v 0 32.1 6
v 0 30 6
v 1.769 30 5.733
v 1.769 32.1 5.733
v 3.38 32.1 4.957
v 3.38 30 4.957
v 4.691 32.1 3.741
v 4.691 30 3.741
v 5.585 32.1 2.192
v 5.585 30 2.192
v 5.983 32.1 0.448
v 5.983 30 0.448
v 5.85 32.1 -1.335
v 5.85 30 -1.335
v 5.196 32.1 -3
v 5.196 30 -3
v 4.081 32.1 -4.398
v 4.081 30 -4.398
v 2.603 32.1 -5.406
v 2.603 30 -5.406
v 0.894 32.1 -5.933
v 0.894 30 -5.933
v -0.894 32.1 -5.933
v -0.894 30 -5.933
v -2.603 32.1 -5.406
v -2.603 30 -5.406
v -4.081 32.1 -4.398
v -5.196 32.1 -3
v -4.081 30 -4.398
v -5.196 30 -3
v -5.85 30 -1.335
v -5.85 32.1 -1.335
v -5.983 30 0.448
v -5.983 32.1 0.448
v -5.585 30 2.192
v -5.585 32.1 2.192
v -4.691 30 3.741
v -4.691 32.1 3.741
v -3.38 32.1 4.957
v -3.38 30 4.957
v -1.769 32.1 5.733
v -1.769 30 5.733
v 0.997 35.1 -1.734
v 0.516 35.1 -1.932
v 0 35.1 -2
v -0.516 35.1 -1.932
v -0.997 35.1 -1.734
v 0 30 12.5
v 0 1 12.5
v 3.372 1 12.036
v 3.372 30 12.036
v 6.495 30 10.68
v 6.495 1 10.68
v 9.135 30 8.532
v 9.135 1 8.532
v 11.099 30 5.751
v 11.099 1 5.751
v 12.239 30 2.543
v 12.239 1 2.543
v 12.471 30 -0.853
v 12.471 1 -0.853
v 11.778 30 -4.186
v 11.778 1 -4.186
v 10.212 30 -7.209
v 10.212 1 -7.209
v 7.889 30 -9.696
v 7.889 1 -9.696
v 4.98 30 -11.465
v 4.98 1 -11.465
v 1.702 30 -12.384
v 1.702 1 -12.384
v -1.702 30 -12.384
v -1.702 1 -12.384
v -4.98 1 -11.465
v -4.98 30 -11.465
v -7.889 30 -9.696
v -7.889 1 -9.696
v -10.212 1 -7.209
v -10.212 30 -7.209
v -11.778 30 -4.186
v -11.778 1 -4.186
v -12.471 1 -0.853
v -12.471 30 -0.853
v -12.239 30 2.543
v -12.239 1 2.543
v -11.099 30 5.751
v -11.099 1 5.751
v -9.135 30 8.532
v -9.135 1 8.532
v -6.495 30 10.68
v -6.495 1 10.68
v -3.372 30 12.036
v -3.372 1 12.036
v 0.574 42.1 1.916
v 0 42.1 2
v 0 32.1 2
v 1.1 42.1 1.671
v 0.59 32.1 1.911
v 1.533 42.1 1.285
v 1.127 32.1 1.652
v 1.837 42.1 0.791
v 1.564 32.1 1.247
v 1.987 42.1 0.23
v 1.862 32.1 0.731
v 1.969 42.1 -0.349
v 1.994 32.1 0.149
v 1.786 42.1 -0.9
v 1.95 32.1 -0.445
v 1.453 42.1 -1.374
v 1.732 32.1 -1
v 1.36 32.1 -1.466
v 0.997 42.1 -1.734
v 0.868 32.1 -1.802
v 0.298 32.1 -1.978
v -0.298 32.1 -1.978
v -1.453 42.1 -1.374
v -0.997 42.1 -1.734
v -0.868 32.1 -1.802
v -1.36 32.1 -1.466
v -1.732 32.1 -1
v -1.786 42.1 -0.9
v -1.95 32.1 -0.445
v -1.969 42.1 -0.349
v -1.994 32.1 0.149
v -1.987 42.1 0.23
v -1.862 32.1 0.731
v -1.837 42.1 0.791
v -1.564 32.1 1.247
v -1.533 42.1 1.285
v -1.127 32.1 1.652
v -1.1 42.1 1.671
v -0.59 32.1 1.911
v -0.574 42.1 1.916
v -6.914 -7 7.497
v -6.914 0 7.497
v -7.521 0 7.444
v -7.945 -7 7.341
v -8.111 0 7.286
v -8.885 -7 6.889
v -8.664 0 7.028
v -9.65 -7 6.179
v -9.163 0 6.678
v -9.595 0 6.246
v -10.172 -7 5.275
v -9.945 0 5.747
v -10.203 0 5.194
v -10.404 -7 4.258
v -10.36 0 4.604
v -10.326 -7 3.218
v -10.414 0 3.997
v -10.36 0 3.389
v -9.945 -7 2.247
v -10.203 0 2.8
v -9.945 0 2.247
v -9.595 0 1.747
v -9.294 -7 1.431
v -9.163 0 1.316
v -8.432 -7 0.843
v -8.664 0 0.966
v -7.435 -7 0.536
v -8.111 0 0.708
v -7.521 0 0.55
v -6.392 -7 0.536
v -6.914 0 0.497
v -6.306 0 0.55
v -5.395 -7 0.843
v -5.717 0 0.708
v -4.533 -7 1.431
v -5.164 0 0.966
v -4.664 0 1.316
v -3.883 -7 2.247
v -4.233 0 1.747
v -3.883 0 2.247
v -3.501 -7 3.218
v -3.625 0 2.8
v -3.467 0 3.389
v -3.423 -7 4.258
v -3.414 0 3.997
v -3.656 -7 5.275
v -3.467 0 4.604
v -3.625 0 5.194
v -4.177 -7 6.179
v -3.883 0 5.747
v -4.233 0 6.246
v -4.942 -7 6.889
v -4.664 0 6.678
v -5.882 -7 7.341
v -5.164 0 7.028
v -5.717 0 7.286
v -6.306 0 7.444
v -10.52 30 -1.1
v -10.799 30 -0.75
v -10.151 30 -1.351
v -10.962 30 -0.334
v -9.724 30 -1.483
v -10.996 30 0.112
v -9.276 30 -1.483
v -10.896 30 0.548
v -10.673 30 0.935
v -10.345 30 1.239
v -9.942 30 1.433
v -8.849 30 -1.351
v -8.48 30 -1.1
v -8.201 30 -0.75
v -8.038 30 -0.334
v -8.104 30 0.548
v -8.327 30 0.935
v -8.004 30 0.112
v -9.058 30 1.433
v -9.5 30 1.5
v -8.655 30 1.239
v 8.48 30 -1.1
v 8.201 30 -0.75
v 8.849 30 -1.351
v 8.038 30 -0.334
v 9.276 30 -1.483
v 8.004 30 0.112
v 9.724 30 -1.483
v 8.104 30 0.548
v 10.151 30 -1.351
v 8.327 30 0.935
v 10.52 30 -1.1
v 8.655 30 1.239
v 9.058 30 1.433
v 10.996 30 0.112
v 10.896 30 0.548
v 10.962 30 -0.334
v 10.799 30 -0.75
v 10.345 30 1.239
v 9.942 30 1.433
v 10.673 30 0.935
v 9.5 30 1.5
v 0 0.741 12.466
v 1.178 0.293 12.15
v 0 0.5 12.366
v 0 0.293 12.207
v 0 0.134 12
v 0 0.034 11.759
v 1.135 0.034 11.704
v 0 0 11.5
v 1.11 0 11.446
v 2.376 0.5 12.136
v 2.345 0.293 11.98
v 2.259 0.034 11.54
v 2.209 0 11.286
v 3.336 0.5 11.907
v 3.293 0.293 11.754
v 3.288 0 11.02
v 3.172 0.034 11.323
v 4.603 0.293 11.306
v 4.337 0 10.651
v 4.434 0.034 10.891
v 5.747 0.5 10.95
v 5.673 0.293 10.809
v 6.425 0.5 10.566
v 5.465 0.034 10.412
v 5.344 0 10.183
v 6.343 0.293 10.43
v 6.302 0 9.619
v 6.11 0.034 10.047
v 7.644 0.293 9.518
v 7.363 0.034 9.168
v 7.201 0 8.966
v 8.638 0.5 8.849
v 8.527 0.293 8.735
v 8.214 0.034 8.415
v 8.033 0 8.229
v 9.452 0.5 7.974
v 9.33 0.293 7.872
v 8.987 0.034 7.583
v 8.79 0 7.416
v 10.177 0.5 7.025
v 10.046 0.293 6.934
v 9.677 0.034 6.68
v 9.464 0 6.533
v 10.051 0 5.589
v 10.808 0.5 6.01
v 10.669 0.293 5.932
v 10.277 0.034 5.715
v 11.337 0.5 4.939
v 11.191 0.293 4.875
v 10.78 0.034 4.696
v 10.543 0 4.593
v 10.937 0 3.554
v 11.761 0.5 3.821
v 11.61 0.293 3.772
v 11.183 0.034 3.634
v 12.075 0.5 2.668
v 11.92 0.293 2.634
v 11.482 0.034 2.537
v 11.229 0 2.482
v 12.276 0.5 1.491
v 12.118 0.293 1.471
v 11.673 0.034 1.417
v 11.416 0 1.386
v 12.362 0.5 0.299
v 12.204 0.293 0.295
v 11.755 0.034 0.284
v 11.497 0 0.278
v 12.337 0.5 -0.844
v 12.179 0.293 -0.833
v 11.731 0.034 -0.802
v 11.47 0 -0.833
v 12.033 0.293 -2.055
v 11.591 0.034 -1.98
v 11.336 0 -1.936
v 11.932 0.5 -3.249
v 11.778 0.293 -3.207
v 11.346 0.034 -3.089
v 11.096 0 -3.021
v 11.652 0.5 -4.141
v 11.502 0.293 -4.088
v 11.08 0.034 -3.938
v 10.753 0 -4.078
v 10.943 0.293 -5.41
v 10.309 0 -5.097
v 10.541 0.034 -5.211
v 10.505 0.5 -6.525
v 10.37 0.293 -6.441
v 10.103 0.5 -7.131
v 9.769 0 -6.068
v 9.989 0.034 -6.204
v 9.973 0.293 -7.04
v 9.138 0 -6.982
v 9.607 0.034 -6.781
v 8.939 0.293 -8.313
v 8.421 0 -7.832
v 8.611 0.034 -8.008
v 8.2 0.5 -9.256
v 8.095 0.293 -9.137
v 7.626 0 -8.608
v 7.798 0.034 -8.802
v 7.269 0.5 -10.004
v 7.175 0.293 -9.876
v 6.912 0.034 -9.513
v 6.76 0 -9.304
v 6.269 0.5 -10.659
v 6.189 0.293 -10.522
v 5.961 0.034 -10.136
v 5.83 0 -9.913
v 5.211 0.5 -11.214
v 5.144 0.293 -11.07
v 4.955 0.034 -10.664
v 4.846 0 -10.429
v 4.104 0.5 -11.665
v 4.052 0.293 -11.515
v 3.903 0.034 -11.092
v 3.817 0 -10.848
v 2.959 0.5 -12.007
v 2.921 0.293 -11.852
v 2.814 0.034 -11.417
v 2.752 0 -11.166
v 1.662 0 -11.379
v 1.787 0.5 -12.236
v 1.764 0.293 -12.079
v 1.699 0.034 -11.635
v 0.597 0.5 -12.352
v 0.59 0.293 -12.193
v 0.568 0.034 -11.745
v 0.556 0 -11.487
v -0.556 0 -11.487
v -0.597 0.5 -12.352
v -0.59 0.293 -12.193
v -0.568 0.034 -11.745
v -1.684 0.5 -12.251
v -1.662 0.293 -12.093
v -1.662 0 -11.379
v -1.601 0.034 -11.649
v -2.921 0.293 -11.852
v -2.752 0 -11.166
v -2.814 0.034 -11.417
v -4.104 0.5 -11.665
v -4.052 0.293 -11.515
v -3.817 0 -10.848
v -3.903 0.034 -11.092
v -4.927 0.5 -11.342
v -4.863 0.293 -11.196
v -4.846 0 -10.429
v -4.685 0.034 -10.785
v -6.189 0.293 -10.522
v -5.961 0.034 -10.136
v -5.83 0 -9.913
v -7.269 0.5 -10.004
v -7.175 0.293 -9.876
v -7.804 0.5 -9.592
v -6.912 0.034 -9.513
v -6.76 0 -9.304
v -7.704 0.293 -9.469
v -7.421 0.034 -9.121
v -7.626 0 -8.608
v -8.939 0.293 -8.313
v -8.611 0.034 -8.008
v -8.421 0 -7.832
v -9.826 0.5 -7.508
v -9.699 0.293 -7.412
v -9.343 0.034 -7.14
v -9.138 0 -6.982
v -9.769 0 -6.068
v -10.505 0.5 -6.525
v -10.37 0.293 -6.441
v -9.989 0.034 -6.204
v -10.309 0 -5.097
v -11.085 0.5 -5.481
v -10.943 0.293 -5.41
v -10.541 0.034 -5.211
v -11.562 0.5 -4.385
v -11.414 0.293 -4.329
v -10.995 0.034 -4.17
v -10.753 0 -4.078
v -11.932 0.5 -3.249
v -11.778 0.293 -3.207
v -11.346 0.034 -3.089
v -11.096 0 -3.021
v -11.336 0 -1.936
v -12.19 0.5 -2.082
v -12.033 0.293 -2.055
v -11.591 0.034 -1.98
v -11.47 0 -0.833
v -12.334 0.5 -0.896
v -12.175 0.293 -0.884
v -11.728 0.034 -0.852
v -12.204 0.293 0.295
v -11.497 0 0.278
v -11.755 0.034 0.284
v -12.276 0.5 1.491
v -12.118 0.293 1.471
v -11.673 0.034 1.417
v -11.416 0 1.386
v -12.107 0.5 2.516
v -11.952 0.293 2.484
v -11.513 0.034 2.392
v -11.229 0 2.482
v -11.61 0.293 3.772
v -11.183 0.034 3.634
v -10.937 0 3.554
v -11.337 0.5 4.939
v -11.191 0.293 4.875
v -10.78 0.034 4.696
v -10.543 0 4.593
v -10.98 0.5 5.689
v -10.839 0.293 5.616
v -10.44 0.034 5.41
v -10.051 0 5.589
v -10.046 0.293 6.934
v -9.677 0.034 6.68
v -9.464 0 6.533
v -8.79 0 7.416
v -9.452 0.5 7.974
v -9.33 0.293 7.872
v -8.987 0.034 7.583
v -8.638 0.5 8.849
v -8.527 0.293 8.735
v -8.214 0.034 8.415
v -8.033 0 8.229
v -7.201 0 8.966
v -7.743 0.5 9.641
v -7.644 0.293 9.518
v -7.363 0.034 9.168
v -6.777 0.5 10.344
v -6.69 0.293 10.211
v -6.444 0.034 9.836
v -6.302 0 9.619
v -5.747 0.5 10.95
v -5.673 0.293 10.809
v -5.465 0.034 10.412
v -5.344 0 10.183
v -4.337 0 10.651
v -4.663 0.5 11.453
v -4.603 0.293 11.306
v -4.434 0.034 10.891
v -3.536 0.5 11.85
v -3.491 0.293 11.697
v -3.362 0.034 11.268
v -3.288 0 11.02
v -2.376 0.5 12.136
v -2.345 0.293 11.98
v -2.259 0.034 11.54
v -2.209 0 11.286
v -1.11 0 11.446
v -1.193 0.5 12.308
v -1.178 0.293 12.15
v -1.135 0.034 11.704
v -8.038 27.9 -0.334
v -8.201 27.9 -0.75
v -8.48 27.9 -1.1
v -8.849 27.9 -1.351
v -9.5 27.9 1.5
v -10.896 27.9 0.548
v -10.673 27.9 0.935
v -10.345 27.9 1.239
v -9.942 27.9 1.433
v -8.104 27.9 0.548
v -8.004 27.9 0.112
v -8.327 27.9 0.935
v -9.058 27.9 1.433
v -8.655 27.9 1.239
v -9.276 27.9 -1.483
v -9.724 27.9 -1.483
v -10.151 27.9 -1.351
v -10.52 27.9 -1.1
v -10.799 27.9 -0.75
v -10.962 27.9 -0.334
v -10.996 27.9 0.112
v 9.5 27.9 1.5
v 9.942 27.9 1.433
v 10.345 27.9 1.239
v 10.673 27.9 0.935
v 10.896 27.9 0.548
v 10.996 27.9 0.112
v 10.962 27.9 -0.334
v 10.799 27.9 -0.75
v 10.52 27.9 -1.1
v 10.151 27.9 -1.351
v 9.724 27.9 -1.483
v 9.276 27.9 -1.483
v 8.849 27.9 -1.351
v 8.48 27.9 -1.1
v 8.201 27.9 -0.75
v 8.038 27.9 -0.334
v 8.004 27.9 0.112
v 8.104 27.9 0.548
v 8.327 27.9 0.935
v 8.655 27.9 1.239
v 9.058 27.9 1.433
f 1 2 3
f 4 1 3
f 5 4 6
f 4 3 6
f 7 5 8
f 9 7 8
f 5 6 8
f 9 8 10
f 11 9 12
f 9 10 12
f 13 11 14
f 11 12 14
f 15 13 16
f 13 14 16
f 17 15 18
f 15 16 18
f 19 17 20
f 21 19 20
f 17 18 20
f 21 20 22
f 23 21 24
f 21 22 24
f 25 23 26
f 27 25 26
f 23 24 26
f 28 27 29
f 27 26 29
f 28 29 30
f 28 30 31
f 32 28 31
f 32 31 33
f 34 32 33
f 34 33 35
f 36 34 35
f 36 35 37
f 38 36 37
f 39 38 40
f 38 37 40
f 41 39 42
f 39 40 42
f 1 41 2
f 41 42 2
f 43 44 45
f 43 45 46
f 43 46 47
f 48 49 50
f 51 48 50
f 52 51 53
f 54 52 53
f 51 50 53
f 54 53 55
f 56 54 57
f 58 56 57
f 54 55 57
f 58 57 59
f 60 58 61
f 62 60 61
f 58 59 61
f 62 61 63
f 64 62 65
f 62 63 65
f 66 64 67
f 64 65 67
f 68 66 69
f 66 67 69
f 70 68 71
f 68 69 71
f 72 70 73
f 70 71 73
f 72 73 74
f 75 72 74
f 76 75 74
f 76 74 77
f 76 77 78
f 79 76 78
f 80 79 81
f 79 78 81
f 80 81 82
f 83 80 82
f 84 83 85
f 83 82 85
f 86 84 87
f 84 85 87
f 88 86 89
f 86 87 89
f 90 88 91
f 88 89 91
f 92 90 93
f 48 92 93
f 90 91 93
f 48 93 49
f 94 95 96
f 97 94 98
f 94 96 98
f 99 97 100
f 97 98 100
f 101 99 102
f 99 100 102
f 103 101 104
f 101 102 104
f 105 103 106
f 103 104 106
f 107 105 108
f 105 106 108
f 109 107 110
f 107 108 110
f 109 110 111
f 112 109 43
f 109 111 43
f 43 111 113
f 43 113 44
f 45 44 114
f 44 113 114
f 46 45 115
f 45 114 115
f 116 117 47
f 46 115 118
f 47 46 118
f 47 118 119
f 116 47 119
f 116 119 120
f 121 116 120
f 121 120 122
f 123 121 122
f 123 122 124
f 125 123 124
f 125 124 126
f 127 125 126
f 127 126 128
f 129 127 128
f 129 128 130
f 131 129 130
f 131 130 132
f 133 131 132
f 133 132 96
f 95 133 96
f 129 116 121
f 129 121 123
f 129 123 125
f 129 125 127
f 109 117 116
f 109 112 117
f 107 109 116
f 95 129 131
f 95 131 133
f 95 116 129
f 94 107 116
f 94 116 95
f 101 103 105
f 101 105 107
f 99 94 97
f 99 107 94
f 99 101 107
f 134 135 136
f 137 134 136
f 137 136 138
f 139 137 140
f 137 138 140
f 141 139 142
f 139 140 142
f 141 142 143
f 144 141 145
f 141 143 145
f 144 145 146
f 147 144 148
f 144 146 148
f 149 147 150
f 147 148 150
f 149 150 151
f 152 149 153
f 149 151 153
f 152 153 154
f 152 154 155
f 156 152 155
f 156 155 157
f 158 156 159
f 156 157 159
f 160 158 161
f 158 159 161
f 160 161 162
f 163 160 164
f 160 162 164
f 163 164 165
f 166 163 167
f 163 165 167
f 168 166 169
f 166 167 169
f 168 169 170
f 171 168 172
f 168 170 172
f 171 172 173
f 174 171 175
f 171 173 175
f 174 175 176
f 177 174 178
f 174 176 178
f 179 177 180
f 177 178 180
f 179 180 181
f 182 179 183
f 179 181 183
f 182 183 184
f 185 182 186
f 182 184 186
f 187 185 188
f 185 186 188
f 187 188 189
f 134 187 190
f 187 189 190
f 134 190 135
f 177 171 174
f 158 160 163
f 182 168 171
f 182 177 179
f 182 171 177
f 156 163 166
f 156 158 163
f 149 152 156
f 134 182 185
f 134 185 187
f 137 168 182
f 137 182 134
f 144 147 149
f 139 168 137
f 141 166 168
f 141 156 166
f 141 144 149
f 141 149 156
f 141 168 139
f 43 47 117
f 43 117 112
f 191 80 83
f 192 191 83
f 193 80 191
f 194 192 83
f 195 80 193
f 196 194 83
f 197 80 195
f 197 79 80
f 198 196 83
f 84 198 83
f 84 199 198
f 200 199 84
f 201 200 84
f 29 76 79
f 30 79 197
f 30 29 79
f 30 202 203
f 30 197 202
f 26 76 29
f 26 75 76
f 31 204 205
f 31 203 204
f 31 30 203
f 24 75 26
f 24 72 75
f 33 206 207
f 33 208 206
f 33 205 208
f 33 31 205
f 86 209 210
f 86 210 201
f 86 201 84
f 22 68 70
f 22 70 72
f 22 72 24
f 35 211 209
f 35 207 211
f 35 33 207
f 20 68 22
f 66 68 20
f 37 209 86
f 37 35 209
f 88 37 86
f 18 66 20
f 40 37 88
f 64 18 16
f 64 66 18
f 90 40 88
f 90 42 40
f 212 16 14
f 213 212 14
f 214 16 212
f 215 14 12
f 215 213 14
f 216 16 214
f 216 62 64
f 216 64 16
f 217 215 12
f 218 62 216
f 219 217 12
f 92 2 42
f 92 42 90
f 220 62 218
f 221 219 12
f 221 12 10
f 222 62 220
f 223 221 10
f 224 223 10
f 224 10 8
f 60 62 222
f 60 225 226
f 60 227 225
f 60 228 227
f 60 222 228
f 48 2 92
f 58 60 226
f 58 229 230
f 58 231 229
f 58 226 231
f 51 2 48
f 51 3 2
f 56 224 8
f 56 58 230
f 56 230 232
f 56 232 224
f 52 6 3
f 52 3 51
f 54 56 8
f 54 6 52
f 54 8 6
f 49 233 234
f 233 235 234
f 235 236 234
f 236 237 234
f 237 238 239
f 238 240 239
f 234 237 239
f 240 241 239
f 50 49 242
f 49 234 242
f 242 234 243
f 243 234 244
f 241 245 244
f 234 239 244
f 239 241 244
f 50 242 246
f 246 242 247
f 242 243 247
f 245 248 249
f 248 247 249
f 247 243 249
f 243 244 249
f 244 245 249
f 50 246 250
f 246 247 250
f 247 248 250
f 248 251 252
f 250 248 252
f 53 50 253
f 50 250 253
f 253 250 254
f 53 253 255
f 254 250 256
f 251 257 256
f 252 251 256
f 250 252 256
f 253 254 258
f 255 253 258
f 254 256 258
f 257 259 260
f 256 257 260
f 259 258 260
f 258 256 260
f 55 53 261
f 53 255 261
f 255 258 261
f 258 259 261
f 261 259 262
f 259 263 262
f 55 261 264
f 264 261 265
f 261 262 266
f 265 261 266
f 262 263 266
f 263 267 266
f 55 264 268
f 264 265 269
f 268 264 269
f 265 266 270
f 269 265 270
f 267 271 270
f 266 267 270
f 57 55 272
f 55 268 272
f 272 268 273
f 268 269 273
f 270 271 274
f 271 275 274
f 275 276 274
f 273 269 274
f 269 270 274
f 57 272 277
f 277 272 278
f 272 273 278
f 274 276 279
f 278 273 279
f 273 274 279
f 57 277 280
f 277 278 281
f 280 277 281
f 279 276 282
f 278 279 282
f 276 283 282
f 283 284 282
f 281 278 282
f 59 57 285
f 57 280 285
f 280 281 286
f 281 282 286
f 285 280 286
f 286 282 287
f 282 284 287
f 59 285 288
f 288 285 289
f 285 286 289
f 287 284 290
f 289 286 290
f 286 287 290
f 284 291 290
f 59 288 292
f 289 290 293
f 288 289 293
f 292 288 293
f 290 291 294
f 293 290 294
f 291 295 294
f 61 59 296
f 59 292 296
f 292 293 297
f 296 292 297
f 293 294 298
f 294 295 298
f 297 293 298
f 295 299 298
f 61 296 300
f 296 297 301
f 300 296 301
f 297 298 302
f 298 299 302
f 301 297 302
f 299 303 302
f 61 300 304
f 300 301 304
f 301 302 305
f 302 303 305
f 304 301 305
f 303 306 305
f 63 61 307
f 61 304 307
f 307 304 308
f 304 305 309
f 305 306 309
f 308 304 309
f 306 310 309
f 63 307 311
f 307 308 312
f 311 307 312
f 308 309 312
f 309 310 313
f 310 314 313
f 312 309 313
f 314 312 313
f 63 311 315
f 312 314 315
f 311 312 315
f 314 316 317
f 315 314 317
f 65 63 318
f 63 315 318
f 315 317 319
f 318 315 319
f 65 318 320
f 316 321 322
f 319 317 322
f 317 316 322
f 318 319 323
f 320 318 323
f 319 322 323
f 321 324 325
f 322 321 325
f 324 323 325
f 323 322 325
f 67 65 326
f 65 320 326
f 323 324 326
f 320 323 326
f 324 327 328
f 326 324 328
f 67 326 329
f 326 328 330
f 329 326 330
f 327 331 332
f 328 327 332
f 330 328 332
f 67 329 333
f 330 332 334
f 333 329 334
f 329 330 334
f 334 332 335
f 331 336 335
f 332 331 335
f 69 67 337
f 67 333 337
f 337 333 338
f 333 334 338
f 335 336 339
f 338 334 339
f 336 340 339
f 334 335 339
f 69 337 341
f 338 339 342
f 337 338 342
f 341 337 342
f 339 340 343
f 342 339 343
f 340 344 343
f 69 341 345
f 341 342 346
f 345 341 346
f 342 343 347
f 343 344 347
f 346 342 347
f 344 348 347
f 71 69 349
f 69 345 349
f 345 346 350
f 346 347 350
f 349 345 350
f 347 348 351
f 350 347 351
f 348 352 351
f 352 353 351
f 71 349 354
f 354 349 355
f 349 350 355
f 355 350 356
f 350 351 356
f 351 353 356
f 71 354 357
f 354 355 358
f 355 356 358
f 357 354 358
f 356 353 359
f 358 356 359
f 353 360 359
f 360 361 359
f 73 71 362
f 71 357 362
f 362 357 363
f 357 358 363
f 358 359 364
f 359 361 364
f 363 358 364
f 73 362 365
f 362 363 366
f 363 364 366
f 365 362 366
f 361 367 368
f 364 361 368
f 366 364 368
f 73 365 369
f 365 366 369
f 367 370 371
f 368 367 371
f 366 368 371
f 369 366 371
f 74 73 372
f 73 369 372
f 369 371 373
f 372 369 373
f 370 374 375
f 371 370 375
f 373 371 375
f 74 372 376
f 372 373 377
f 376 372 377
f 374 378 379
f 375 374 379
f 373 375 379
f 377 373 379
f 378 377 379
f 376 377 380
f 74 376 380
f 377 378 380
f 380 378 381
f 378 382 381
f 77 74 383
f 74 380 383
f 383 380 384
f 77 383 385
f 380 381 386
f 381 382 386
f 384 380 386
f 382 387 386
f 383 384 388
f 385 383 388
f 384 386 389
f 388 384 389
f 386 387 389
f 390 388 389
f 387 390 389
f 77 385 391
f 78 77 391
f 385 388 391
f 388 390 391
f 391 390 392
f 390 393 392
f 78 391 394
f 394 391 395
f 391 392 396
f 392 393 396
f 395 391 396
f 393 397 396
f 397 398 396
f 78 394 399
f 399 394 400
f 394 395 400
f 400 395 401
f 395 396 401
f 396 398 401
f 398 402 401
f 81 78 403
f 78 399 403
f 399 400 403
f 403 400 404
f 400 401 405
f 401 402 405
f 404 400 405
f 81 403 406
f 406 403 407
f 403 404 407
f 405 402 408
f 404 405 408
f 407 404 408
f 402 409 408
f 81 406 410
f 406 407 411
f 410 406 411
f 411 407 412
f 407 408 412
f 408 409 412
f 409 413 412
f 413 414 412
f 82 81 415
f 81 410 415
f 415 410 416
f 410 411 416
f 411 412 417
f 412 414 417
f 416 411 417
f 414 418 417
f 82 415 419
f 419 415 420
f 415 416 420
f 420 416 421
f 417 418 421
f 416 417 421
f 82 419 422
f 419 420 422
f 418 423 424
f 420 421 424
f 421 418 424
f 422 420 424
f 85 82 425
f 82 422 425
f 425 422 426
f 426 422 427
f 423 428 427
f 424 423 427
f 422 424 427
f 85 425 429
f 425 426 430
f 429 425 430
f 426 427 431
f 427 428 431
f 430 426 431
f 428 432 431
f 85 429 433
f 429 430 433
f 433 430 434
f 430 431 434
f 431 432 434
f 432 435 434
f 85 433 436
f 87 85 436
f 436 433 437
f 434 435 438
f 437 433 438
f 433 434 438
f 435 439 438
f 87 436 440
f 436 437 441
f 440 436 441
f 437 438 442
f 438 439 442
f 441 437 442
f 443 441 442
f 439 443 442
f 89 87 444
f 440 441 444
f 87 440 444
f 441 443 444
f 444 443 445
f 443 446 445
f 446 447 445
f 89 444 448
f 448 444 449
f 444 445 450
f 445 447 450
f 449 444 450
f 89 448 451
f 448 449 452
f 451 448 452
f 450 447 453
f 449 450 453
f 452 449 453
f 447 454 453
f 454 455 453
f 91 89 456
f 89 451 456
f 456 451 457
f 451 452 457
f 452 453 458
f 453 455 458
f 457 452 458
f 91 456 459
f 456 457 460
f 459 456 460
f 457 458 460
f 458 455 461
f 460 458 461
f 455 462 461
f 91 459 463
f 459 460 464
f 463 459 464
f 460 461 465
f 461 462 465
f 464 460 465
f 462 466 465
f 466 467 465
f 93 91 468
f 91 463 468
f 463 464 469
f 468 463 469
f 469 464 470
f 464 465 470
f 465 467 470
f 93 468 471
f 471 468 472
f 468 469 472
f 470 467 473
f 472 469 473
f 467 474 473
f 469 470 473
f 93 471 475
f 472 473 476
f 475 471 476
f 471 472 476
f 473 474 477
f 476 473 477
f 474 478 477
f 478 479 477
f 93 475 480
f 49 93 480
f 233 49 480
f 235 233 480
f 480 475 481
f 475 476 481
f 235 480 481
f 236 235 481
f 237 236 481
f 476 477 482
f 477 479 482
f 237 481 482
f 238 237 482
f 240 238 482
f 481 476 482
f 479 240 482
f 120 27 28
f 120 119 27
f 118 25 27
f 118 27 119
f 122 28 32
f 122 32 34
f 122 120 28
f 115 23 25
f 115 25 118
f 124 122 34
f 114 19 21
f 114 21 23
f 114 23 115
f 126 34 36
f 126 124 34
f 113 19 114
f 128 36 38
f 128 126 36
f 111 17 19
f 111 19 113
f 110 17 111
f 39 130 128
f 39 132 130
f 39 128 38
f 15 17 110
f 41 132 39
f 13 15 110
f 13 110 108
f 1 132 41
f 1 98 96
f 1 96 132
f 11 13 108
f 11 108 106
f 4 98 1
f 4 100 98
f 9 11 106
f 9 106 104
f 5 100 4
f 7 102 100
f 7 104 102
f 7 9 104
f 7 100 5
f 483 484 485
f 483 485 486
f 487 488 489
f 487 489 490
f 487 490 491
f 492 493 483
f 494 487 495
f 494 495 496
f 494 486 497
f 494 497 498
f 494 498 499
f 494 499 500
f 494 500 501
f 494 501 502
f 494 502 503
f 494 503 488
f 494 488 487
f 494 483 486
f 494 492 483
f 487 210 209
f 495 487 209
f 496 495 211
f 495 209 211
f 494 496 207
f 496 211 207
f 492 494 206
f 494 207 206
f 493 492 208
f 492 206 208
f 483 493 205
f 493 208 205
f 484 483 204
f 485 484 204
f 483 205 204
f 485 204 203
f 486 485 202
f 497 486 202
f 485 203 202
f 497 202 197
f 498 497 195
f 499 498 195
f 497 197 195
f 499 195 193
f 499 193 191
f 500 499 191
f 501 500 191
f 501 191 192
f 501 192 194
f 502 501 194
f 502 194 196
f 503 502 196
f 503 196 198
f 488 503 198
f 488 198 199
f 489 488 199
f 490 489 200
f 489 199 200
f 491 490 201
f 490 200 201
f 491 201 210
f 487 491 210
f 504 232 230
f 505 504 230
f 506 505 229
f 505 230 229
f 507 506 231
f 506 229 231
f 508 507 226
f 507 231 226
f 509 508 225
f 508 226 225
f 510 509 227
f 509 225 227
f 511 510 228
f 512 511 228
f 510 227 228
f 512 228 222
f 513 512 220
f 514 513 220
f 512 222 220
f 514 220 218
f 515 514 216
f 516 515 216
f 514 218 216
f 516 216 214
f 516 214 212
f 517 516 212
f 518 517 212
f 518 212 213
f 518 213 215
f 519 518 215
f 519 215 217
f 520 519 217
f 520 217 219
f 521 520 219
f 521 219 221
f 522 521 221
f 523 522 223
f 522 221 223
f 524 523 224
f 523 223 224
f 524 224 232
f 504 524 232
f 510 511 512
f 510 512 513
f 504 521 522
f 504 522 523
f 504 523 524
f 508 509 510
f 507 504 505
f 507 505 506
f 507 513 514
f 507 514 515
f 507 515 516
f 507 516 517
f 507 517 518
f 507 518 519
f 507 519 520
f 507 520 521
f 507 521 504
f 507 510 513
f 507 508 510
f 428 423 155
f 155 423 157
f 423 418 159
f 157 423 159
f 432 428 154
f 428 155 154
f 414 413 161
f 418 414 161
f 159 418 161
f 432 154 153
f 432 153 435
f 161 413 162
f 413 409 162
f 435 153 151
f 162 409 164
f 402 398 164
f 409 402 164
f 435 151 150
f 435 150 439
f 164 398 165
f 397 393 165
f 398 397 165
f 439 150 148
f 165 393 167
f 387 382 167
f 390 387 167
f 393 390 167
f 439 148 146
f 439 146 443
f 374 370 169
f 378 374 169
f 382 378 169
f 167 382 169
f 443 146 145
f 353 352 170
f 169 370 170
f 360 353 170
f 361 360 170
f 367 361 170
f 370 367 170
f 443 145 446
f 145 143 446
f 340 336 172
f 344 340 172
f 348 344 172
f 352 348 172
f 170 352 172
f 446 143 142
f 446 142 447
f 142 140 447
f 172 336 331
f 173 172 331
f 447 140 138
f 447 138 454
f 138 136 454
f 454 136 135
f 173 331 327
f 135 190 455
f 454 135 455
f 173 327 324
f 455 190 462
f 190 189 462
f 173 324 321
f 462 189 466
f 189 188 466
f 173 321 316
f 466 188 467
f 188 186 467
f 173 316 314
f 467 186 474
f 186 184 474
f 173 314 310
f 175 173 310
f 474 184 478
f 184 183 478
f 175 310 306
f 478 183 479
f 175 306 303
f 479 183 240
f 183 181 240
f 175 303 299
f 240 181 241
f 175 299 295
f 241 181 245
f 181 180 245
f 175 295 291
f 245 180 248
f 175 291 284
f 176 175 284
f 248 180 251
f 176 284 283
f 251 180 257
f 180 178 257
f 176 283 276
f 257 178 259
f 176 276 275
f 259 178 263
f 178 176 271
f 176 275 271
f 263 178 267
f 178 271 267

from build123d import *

# Parameters (mm, degrees)
SKETCH_1_R          = 12.5
EXTRUDE_1_DEPTH     = 30
FILLET_1_R          = 1
SKETCH_2_R          = 6
EXTRUDE_2_DEPTH     = 2.1
SKETCH_3_R          = 1.5
CUT_EXTRUDE_1_DEPTH = 2.1
SKETCH_4_R          = 2
EXTRUDE_3_DEPTH     = 10
CUT_EXTRUDE_START   = -7
CUT_EXTRUDE_2_DEPTH = 7
SKETCH_6_R          = 3.5
EXTRUDE_4_DEPTH     = 7


with BuildPart() as part:
    # 草图1 → 凸台-拉伸1 (new body)
    with BuildSketch(Plane(origin=(0, 0, 0), x_dir=(1, 0, 0), z_dir=(0, 1, 0))):
        with Locations(Location((0, 0, 0), (0, 0, 270))):
            Circle(SKETCH_1_R)
    extrude(amount=EXTRUDE_1_DEPTH)

    # 圆角1
    fillet_1_edges = [part.edges().sort_by_distance(p)[0] for p in [
        (0, 0, -12.5),
    ]]
    fillet(fillet_1_edges, radius=FILLET_1_R)

    # 草图2 → 凸台-拉伸2 (add)
    with BuildSketch(Plane(origin=(0, 30, 0), x_dir=(1, 0, 0), z_dir=(0, 1, 0))):
        with Locations(Location((0, 0, 0), (0, 0, 270))):
            Circle(SKETCH_2_R)
    extrude(amount=EXTRUDE_2_DEPTH)

    # 草图3 → 切除-拉伸1 (cut)
    with BuildSketch(Plane(origin=(0, 30, 0), x_dir=(1, 0, 0), z_dir=(0, 1, 0))):
        with Locations(Location((-9.5, 0, 0), (0, 0, 270))):
            Circle(SKETCH_3_R)
        with Locations(Location((9.5, 0, 0), (0, 0, 270))):
            Circle(SKETCH_3_R)
    extrude(amount=-CUT_EXTRUDE_1_DEPTH, mode=Mode.SUBTRACT)

    # 草图4 → 凸台-拉伸3 (add)
    with BuildSketch(Plane(origin=(0, 32.1, 0), x_dir=(1, 0, 0), z_dir=(0, 1, 0))):
        with Locations(Location((0, 0, 0), (0, 0, 270))):
            Circle(SKETCH_4_R)
    extrude(amount=EXTRUDE_3_DEPTH)

    # 草图5 → 切除-拉伸2 (cut)
    with BuildSketch(Plane(origin=(0, 42.1, 0), x_dir=(1, 0, 0), z_dir=(0, 1, 0)).offset(CUT_EXTRUDE_START)):
        with BuildLine():
            Line((-0.99729895, 1.733607454), (0.99729895, 1.733607454))
            ThreePointArc((0.99729895, 1.733607454), (0, 2), (-0.99729895, 1.733607454))
        make_face()
    extrude(amount=CUT_EXTRUDE_2_DEPTH, mode=Mode.SUBTRACT)

    # 草图6 → 凸台-拉伸4 (add)
    with BuildSketch(Plane.XZ):
        with Locations(Location((-6.913670465, 3.996713823, 0), (0, 0, 90))):
            Circle(SKETCH_6_R)
    extrude(amount=EXTRUDE_4_DEPTH)


solid = part.part
